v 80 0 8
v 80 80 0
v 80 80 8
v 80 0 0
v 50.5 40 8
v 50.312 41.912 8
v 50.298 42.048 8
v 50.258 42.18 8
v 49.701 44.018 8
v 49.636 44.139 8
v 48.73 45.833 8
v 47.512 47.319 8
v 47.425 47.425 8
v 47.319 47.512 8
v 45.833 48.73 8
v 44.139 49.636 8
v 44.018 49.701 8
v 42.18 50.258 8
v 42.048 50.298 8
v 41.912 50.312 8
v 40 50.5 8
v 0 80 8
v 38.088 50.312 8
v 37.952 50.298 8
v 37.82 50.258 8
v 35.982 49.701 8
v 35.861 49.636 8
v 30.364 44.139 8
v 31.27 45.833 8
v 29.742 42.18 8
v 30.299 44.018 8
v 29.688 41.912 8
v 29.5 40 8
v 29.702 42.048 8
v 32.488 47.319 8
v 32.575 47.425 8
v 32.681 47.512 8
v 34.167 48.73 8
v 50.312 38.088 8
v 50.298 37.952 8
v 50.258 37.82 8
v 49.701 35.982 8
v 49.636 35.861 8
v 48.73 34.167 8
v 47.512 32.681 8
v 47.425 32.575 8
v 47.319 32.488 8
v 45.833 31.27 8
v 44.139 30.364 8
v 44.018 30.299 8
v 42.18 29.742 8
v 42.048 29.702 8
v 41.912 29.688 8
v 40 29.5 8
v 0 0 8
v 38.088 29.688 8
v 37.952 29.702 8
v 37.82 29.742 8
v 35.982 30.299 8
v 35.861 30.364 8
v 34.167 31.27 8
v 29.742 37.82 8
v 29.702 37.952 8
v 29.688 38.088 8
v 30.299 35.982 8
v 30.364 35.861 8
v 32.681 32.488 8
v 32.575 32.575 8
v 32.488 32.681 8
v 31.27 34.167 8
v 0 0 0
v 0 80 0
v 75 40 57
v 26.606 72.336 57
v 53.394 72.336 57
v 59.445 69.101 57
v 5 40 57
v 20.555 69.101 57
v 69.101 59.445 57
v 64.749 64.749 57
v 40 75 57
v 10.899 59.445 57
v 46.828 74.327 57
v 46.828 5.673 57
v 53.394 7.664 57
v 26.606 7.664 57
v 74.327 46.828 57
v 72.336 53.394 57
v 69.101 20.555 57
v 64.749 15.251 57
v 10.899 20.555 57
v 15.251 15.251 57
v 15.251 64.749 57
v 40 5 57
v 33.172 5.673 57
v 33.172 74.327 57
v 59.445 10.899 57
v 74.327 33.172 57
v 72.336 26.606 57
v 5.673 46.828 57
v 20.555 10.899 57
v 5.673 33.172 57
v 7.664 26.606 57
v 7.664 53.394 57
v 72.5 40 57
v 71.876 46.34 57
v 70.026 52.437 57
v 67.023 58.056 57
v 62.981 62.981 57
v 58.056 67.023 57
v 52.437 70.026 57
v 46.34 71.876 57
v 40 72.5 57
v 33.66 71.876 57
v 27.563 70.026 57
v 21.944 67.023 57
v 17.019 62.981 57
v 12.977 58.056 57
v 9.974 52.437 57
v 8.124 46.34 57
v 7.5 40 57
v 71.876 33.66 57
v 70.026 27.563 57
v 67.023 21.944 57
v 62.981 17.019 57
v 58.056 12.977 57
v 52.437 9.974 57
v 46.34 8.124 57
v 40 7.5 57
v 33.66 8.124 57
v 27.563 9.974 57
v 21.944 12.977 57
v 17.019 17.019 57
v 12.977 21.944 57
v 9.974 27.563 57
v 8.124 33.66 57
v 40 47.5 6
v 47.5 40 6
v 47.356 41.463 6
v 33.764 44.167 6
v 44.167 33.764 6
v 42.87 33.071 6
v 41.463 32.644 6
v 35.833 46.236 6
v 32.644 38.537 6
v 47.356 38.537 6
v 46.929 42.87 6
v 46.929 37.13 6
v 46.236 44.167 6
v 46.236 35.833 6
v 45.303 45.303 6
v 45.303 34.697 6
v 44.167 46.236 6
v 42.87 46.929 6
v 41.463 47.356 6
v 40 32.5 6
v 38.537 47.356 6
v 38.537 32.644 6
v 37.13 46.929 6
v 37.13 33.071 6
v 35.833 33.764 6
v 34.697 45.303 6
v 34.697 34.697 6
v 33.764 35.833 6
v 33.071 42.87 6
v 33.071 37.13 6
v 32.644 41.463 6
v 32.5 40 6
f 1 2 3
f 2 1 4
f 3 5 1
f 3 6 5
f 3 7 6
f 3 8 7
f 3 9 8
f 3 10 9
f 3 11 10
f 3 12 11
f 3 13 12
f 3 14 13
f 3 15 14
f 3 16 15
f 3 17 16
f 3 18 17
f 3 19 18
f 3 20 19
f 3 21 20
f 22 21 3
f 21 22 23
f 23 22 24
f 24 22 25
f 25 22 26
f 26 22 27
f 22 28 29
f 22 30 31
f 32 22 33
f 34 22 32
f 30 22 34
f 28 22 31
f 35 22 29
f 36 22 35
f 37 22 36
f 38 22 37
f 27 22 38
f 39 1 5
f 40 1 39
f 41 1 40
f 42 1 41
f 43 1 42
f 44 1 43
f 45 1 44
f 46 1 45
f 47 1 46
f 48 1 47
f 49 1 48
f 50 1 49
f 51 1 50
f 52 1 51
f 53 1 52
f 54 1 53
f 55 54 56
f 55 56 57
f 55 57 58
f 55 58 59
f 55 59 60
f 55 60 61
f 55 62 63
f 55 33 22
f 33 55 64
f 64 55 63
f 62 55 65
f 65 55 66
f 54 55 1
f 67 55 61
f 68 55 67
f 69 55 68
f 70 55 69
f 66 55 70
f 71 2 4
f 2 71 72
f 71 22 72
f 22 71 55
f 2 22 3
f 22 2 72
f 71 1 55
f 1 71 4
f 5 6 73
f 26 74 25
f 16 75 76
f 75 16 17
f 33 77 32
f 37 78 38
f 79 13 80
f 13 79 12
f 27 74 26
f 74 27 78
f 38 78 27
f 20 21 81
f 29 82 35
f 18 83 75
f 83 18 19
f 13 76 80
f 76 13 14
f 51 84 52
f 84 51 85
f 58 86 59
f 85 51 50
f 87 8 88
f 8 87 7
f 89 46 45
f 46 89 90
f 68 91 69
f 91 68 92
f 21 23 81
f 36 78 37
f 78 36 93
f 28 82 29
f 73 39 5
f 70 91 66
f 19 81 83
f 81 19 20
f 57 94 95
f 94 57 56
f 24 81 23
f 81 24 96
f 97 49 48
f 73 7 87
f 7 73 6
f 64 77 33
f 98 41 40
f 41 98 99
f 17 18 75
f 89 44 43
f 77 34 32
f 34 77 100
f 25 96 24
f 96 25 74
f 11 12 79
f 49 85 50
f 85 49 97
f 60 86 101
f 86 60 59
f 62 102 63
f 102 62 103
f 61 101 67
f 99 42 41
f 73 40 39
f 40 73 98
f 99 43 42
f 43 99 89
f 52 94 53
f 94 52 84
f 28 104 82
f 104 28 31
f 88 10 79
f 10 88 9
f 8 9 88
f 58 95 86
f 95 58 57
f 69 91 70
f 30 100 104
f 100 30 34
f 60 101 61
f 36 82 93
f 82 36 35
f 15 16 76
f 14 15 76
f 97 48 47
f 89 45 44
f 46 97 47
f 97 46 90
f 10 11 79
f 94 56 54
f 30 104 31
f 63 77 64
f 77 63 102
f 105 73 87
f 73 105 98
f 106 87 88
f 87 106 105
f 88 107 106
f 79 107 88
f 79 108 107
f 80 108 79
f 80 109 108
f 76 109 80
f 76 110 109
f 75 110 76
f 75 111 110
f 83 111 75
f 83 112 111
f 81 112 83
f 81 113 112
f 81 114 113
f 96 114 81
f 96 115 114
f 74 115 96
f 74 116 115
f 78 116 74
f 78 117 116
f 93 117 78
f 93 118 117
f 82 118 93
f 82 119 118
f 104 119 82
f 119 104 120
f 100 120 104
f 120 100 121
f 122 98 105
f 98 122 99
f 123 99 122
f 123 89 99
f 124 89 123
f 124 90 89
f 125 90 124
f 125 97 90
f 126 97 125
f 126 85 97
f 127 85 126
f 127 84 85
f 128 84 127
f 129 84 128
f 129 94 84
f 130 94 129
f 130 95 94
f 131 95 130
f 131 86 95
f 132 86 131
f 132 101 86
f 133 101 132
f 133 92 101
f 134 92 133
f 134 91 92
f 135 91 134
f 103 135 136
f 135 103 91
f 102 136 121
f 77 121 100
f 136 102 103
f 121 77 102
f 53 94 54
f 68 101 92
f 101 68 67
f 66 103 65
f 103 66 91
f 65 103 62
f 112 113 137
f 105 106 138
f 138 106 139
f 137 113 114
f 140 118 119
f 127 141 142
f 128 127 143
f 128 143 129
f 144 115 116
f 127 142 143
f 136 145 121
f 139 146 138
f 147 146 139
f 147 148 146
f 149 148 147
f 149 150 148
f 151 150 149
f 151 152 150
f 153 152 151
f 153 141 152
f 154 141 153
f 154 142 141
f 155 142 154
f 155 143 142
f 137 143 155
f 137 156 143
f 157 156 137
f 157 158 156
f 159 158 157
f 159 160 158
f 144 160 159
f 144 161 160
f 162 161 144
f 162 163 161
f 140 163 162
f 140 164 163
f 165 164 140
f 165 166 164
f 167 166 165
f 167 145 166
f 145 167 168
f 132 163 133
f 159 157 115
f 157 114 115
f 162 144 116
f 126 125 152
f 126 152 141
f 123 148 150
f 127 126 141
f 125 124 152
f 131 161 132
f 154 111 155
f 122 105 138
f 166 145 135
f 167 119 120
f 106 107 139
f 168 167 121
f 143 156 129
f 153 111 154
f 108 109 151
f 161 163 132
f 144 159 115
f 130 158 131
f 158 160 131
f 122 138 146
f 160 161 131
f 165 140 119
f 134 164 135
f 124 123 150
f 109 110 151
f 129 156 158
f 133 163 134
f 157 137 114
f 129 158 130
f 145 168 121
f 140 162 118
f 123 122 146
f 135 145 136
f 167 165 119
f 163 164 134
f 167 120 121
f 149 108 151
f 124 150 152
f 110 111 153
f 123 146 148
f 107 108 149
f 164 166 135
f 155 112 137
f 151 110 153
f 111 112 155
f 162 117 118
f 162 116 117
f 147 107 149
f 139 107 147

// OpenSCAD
$fn = 32;

// ----------------------------------------------------------------------
// Hopper: funnel with square flange
// ----------------------------------------------------------------------

// --- parameters (mm) ---
fl = 80;                  // flange side, X and Y
fl_t = 8;                 // flange thickness
cone_h = 50;              // cone height above the flange
top_d = 70;               // cone mouth diameter
bot_d = 20;               // cone spout diameter
wall = 2.5;               // cone wall thickness
fit_tol = 0.1;            // tolerance for press fits, mm
free_tol = 0.5;           // tolerance for clearance fits, mm

bore_d = bot_d - 2 * wall;  // spout bore diameter
total_h = fl_t + cone_h - 1;  // overall height

difference() {
  union() {
    cube([fl, fl, fl_t]);
    translate([fl / 2, fl / 2, fl_t - 1])
      cylinder(h = cone_h, d1 = bot_d, d2 = top_d);
  }
  translate([fl / 2, fl / 2, fl_t - 2])
    cylinder(h = cone_h + 1, d1 = bore_d, d2 = top_d - 2 * wall);
}
